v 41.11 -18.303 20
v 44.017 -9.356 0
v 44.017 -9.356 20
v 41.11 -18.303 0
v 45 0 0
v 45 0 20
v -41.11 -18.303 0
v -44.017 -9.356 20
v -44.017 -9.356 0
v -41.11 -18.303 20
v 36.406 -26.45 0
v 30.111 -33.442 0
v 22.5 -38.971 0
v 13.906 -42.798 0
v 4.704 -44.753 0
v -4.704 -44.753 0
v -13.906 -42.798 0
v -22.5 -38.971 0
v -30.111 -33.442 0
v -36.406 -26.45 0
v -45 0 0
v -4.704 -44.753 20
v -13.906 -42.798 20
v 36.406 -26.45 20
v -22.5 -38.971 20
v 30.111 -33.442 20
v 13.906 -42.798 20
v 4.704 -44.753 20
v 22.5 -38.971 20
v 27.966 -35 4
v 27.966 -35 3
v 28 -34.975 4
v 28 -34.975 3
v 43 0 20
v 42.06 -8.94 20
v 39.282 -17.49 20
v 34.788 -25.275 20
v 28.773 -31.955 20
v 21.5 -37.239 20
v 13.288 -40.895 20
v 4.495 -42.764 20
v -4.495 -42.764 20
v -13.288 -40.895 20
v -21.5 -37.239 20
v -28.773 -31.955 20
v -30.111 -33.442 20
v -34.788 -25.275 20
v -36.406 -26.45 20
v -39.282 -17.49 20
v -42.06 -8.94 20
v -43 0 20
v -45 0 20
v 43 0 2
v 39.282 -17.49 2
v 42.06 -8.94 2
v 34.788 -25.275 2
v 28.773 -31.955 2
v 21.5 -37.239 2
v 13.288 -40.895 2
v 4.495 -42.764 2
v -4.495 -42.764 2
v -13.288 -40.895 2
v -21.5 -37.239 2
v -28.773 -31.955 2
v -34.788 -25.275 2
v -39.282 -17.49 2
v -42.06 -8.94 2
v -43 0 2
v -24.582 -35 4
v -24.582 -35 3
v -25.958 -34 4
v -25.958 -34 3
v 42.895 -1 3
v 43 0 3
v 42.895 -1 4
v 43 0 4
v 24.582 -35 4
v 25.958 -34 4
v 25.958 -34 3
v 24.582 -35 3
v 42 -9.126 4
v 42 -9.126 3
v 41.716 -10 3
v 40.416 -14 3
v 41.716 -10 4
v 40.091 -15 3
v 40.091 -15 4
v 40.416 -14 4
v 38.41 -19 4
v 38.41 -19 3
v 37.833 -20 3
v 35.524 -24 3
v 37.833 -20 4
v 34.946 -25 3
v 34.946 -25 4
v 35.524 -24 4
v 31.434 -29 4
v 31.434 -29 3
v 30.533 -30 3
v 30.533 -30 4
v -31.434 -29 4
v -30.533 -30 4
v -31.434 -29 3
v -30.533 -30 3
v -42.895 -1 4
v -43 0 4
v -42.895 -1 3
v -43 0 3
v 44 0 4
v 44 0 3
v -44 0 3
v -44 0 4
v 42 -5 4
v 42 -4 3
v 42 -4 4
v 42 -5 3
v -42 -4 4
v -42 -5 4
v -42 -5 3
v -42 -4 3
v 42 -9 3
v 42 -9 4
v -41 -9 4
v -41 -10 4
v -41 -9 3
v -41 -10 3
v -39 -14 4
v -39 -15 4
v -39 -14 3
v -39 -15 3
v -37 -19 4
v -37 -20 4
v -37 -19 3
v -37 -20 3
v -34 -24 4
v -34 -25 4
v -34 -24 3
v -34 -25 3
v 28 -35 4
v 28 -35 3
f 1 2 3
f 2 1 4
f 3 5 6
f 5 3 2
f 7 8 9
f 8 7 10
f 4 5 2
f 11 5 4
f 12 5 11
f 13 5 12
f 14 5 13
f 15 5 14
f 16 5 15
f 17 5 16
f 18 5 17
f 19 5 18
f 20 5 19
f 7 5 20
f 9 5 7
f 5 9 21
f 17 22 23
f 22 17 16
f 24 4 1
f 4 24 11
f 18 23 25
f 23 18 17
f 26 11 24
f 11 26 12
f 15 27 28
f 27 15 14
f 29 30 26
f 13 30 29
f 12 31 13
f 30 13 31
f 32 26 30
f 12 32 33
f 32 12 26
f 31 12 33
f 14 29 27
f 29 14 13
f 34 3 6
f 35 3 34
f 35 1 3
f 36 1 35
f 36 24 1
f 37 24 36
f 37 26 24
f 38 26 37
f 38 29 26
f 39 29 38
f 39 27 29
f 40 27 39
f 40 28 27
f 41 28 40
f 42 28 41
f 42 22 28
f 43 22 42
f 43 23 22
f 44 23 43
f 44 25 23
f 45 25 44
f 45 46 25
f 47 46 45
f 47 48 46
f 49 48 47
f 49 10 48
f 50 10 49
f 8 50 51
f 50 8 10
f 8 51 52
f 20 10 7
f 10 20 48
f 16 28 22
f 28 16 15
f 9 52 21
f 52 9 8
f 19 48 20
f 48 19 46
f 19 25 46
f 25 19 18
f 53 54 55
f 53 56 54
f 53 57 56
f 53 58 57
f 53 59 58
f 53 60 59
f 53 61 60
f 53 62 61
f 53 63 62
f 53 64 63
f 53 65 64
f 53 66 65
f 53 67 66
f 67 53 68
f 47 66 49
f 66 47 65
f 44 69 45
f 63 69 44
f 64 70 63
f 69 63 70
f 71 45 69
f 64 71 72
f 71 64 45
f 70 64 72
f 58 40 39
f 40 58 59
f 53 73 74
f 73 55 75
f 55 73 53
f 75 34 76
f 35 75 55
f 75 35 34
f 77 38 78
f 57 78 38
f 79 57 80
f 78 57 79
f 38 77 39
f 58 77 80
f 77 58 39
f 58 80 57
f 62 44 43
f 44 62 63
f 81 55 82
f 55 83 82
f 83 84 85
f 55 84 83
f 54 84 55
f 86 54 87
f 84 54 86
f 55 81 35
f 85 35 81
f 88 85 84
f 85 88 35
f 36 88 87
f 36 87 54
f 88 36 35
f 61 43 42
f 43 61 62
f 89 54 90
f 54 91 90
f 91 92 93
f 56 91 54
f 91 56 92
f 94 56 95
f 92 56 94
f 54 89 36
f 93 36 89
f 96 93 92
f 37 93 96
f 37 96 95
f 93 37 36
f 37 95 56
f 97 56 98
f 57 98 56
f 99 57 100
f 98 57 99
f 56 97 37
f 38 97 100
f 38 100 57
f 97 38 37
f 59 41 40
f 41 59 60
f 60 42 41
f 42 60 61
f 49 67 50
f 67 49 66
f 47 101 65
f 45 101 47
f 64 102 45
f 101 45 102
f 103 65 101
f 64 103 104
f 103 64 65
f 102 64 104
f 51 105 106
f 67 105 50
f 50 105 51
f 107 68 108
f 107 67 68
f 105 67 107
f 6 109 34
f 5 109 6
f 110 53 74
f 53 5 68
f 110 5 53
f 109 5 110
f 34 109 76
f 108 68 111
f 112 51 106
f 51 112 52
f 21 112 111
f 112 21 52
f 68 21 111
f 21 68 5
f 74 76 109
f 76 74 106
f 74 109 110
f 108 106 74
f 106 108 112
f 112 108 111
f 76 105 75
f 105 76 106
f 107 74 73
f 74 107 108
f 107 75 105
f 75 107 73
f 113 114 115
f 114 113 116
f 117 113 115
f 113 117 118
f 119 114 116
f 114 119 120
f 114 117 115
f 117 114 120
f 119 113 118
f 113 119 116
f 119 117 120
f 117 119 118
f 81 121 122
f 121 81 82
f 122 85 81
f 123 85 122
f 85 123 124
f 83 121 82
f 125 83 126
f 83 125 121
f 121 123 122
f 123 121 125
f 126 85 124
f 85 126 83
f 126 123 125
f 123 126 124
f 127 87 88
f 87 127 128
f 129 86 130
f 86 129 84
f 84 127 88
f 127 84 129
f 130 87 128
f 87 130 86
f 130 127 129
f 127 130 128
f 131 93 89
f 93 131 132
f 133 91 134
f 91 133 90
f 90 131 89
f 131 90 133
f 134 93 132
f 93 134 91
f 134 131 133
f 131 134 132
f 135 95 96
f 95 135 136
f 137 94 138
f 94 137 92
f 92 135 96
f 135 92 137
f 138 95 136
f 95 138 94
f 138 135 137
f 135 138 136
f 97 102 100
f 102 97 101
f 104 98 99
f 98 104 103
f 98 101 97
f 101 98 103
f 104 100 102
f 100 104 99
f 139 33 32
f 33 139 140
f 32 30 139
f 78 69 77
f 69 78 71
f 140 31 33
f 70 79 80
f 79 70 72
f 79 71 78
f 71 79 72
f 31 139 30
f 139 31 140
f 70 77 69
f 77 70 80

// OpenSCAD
$fn=30;
difference(){
	difference(){
		cylinder(h=20, r=45);
		translate([0,0,2])
			cylinder(h=25,r=43);
	}

	translate([-45,0,-1])
		cube(112);
}

for (i=[-42:45])
{
translate([1-i,-1,3])
cube([1,1,1]);
}

for (i=[-40:43])
{
translate([1-i,-5,3])
cube([1,1,1]);
}

for (i=[-40:42])
{
translate([1-i,-10,3])
cube([1,1,1]);
}

for (i=[-40:40])
{
translate([1-i,-15,3])
cube([1,1,1]);
}

for (i=[-38:38])
{
translate([1-i,-20,3])
cube([1,1,1]);
}

for (i=[-34:35])
{
translate([1-i,-25,3])
cube([1,1,1]);
}

for (i=[-30:33])
{
translate([1-i,-30,3])
cube([1,1,1]);
}

for (i=[-26:28])
{
translate([1-i,-35,3])
cube([1,1,1]);
}
